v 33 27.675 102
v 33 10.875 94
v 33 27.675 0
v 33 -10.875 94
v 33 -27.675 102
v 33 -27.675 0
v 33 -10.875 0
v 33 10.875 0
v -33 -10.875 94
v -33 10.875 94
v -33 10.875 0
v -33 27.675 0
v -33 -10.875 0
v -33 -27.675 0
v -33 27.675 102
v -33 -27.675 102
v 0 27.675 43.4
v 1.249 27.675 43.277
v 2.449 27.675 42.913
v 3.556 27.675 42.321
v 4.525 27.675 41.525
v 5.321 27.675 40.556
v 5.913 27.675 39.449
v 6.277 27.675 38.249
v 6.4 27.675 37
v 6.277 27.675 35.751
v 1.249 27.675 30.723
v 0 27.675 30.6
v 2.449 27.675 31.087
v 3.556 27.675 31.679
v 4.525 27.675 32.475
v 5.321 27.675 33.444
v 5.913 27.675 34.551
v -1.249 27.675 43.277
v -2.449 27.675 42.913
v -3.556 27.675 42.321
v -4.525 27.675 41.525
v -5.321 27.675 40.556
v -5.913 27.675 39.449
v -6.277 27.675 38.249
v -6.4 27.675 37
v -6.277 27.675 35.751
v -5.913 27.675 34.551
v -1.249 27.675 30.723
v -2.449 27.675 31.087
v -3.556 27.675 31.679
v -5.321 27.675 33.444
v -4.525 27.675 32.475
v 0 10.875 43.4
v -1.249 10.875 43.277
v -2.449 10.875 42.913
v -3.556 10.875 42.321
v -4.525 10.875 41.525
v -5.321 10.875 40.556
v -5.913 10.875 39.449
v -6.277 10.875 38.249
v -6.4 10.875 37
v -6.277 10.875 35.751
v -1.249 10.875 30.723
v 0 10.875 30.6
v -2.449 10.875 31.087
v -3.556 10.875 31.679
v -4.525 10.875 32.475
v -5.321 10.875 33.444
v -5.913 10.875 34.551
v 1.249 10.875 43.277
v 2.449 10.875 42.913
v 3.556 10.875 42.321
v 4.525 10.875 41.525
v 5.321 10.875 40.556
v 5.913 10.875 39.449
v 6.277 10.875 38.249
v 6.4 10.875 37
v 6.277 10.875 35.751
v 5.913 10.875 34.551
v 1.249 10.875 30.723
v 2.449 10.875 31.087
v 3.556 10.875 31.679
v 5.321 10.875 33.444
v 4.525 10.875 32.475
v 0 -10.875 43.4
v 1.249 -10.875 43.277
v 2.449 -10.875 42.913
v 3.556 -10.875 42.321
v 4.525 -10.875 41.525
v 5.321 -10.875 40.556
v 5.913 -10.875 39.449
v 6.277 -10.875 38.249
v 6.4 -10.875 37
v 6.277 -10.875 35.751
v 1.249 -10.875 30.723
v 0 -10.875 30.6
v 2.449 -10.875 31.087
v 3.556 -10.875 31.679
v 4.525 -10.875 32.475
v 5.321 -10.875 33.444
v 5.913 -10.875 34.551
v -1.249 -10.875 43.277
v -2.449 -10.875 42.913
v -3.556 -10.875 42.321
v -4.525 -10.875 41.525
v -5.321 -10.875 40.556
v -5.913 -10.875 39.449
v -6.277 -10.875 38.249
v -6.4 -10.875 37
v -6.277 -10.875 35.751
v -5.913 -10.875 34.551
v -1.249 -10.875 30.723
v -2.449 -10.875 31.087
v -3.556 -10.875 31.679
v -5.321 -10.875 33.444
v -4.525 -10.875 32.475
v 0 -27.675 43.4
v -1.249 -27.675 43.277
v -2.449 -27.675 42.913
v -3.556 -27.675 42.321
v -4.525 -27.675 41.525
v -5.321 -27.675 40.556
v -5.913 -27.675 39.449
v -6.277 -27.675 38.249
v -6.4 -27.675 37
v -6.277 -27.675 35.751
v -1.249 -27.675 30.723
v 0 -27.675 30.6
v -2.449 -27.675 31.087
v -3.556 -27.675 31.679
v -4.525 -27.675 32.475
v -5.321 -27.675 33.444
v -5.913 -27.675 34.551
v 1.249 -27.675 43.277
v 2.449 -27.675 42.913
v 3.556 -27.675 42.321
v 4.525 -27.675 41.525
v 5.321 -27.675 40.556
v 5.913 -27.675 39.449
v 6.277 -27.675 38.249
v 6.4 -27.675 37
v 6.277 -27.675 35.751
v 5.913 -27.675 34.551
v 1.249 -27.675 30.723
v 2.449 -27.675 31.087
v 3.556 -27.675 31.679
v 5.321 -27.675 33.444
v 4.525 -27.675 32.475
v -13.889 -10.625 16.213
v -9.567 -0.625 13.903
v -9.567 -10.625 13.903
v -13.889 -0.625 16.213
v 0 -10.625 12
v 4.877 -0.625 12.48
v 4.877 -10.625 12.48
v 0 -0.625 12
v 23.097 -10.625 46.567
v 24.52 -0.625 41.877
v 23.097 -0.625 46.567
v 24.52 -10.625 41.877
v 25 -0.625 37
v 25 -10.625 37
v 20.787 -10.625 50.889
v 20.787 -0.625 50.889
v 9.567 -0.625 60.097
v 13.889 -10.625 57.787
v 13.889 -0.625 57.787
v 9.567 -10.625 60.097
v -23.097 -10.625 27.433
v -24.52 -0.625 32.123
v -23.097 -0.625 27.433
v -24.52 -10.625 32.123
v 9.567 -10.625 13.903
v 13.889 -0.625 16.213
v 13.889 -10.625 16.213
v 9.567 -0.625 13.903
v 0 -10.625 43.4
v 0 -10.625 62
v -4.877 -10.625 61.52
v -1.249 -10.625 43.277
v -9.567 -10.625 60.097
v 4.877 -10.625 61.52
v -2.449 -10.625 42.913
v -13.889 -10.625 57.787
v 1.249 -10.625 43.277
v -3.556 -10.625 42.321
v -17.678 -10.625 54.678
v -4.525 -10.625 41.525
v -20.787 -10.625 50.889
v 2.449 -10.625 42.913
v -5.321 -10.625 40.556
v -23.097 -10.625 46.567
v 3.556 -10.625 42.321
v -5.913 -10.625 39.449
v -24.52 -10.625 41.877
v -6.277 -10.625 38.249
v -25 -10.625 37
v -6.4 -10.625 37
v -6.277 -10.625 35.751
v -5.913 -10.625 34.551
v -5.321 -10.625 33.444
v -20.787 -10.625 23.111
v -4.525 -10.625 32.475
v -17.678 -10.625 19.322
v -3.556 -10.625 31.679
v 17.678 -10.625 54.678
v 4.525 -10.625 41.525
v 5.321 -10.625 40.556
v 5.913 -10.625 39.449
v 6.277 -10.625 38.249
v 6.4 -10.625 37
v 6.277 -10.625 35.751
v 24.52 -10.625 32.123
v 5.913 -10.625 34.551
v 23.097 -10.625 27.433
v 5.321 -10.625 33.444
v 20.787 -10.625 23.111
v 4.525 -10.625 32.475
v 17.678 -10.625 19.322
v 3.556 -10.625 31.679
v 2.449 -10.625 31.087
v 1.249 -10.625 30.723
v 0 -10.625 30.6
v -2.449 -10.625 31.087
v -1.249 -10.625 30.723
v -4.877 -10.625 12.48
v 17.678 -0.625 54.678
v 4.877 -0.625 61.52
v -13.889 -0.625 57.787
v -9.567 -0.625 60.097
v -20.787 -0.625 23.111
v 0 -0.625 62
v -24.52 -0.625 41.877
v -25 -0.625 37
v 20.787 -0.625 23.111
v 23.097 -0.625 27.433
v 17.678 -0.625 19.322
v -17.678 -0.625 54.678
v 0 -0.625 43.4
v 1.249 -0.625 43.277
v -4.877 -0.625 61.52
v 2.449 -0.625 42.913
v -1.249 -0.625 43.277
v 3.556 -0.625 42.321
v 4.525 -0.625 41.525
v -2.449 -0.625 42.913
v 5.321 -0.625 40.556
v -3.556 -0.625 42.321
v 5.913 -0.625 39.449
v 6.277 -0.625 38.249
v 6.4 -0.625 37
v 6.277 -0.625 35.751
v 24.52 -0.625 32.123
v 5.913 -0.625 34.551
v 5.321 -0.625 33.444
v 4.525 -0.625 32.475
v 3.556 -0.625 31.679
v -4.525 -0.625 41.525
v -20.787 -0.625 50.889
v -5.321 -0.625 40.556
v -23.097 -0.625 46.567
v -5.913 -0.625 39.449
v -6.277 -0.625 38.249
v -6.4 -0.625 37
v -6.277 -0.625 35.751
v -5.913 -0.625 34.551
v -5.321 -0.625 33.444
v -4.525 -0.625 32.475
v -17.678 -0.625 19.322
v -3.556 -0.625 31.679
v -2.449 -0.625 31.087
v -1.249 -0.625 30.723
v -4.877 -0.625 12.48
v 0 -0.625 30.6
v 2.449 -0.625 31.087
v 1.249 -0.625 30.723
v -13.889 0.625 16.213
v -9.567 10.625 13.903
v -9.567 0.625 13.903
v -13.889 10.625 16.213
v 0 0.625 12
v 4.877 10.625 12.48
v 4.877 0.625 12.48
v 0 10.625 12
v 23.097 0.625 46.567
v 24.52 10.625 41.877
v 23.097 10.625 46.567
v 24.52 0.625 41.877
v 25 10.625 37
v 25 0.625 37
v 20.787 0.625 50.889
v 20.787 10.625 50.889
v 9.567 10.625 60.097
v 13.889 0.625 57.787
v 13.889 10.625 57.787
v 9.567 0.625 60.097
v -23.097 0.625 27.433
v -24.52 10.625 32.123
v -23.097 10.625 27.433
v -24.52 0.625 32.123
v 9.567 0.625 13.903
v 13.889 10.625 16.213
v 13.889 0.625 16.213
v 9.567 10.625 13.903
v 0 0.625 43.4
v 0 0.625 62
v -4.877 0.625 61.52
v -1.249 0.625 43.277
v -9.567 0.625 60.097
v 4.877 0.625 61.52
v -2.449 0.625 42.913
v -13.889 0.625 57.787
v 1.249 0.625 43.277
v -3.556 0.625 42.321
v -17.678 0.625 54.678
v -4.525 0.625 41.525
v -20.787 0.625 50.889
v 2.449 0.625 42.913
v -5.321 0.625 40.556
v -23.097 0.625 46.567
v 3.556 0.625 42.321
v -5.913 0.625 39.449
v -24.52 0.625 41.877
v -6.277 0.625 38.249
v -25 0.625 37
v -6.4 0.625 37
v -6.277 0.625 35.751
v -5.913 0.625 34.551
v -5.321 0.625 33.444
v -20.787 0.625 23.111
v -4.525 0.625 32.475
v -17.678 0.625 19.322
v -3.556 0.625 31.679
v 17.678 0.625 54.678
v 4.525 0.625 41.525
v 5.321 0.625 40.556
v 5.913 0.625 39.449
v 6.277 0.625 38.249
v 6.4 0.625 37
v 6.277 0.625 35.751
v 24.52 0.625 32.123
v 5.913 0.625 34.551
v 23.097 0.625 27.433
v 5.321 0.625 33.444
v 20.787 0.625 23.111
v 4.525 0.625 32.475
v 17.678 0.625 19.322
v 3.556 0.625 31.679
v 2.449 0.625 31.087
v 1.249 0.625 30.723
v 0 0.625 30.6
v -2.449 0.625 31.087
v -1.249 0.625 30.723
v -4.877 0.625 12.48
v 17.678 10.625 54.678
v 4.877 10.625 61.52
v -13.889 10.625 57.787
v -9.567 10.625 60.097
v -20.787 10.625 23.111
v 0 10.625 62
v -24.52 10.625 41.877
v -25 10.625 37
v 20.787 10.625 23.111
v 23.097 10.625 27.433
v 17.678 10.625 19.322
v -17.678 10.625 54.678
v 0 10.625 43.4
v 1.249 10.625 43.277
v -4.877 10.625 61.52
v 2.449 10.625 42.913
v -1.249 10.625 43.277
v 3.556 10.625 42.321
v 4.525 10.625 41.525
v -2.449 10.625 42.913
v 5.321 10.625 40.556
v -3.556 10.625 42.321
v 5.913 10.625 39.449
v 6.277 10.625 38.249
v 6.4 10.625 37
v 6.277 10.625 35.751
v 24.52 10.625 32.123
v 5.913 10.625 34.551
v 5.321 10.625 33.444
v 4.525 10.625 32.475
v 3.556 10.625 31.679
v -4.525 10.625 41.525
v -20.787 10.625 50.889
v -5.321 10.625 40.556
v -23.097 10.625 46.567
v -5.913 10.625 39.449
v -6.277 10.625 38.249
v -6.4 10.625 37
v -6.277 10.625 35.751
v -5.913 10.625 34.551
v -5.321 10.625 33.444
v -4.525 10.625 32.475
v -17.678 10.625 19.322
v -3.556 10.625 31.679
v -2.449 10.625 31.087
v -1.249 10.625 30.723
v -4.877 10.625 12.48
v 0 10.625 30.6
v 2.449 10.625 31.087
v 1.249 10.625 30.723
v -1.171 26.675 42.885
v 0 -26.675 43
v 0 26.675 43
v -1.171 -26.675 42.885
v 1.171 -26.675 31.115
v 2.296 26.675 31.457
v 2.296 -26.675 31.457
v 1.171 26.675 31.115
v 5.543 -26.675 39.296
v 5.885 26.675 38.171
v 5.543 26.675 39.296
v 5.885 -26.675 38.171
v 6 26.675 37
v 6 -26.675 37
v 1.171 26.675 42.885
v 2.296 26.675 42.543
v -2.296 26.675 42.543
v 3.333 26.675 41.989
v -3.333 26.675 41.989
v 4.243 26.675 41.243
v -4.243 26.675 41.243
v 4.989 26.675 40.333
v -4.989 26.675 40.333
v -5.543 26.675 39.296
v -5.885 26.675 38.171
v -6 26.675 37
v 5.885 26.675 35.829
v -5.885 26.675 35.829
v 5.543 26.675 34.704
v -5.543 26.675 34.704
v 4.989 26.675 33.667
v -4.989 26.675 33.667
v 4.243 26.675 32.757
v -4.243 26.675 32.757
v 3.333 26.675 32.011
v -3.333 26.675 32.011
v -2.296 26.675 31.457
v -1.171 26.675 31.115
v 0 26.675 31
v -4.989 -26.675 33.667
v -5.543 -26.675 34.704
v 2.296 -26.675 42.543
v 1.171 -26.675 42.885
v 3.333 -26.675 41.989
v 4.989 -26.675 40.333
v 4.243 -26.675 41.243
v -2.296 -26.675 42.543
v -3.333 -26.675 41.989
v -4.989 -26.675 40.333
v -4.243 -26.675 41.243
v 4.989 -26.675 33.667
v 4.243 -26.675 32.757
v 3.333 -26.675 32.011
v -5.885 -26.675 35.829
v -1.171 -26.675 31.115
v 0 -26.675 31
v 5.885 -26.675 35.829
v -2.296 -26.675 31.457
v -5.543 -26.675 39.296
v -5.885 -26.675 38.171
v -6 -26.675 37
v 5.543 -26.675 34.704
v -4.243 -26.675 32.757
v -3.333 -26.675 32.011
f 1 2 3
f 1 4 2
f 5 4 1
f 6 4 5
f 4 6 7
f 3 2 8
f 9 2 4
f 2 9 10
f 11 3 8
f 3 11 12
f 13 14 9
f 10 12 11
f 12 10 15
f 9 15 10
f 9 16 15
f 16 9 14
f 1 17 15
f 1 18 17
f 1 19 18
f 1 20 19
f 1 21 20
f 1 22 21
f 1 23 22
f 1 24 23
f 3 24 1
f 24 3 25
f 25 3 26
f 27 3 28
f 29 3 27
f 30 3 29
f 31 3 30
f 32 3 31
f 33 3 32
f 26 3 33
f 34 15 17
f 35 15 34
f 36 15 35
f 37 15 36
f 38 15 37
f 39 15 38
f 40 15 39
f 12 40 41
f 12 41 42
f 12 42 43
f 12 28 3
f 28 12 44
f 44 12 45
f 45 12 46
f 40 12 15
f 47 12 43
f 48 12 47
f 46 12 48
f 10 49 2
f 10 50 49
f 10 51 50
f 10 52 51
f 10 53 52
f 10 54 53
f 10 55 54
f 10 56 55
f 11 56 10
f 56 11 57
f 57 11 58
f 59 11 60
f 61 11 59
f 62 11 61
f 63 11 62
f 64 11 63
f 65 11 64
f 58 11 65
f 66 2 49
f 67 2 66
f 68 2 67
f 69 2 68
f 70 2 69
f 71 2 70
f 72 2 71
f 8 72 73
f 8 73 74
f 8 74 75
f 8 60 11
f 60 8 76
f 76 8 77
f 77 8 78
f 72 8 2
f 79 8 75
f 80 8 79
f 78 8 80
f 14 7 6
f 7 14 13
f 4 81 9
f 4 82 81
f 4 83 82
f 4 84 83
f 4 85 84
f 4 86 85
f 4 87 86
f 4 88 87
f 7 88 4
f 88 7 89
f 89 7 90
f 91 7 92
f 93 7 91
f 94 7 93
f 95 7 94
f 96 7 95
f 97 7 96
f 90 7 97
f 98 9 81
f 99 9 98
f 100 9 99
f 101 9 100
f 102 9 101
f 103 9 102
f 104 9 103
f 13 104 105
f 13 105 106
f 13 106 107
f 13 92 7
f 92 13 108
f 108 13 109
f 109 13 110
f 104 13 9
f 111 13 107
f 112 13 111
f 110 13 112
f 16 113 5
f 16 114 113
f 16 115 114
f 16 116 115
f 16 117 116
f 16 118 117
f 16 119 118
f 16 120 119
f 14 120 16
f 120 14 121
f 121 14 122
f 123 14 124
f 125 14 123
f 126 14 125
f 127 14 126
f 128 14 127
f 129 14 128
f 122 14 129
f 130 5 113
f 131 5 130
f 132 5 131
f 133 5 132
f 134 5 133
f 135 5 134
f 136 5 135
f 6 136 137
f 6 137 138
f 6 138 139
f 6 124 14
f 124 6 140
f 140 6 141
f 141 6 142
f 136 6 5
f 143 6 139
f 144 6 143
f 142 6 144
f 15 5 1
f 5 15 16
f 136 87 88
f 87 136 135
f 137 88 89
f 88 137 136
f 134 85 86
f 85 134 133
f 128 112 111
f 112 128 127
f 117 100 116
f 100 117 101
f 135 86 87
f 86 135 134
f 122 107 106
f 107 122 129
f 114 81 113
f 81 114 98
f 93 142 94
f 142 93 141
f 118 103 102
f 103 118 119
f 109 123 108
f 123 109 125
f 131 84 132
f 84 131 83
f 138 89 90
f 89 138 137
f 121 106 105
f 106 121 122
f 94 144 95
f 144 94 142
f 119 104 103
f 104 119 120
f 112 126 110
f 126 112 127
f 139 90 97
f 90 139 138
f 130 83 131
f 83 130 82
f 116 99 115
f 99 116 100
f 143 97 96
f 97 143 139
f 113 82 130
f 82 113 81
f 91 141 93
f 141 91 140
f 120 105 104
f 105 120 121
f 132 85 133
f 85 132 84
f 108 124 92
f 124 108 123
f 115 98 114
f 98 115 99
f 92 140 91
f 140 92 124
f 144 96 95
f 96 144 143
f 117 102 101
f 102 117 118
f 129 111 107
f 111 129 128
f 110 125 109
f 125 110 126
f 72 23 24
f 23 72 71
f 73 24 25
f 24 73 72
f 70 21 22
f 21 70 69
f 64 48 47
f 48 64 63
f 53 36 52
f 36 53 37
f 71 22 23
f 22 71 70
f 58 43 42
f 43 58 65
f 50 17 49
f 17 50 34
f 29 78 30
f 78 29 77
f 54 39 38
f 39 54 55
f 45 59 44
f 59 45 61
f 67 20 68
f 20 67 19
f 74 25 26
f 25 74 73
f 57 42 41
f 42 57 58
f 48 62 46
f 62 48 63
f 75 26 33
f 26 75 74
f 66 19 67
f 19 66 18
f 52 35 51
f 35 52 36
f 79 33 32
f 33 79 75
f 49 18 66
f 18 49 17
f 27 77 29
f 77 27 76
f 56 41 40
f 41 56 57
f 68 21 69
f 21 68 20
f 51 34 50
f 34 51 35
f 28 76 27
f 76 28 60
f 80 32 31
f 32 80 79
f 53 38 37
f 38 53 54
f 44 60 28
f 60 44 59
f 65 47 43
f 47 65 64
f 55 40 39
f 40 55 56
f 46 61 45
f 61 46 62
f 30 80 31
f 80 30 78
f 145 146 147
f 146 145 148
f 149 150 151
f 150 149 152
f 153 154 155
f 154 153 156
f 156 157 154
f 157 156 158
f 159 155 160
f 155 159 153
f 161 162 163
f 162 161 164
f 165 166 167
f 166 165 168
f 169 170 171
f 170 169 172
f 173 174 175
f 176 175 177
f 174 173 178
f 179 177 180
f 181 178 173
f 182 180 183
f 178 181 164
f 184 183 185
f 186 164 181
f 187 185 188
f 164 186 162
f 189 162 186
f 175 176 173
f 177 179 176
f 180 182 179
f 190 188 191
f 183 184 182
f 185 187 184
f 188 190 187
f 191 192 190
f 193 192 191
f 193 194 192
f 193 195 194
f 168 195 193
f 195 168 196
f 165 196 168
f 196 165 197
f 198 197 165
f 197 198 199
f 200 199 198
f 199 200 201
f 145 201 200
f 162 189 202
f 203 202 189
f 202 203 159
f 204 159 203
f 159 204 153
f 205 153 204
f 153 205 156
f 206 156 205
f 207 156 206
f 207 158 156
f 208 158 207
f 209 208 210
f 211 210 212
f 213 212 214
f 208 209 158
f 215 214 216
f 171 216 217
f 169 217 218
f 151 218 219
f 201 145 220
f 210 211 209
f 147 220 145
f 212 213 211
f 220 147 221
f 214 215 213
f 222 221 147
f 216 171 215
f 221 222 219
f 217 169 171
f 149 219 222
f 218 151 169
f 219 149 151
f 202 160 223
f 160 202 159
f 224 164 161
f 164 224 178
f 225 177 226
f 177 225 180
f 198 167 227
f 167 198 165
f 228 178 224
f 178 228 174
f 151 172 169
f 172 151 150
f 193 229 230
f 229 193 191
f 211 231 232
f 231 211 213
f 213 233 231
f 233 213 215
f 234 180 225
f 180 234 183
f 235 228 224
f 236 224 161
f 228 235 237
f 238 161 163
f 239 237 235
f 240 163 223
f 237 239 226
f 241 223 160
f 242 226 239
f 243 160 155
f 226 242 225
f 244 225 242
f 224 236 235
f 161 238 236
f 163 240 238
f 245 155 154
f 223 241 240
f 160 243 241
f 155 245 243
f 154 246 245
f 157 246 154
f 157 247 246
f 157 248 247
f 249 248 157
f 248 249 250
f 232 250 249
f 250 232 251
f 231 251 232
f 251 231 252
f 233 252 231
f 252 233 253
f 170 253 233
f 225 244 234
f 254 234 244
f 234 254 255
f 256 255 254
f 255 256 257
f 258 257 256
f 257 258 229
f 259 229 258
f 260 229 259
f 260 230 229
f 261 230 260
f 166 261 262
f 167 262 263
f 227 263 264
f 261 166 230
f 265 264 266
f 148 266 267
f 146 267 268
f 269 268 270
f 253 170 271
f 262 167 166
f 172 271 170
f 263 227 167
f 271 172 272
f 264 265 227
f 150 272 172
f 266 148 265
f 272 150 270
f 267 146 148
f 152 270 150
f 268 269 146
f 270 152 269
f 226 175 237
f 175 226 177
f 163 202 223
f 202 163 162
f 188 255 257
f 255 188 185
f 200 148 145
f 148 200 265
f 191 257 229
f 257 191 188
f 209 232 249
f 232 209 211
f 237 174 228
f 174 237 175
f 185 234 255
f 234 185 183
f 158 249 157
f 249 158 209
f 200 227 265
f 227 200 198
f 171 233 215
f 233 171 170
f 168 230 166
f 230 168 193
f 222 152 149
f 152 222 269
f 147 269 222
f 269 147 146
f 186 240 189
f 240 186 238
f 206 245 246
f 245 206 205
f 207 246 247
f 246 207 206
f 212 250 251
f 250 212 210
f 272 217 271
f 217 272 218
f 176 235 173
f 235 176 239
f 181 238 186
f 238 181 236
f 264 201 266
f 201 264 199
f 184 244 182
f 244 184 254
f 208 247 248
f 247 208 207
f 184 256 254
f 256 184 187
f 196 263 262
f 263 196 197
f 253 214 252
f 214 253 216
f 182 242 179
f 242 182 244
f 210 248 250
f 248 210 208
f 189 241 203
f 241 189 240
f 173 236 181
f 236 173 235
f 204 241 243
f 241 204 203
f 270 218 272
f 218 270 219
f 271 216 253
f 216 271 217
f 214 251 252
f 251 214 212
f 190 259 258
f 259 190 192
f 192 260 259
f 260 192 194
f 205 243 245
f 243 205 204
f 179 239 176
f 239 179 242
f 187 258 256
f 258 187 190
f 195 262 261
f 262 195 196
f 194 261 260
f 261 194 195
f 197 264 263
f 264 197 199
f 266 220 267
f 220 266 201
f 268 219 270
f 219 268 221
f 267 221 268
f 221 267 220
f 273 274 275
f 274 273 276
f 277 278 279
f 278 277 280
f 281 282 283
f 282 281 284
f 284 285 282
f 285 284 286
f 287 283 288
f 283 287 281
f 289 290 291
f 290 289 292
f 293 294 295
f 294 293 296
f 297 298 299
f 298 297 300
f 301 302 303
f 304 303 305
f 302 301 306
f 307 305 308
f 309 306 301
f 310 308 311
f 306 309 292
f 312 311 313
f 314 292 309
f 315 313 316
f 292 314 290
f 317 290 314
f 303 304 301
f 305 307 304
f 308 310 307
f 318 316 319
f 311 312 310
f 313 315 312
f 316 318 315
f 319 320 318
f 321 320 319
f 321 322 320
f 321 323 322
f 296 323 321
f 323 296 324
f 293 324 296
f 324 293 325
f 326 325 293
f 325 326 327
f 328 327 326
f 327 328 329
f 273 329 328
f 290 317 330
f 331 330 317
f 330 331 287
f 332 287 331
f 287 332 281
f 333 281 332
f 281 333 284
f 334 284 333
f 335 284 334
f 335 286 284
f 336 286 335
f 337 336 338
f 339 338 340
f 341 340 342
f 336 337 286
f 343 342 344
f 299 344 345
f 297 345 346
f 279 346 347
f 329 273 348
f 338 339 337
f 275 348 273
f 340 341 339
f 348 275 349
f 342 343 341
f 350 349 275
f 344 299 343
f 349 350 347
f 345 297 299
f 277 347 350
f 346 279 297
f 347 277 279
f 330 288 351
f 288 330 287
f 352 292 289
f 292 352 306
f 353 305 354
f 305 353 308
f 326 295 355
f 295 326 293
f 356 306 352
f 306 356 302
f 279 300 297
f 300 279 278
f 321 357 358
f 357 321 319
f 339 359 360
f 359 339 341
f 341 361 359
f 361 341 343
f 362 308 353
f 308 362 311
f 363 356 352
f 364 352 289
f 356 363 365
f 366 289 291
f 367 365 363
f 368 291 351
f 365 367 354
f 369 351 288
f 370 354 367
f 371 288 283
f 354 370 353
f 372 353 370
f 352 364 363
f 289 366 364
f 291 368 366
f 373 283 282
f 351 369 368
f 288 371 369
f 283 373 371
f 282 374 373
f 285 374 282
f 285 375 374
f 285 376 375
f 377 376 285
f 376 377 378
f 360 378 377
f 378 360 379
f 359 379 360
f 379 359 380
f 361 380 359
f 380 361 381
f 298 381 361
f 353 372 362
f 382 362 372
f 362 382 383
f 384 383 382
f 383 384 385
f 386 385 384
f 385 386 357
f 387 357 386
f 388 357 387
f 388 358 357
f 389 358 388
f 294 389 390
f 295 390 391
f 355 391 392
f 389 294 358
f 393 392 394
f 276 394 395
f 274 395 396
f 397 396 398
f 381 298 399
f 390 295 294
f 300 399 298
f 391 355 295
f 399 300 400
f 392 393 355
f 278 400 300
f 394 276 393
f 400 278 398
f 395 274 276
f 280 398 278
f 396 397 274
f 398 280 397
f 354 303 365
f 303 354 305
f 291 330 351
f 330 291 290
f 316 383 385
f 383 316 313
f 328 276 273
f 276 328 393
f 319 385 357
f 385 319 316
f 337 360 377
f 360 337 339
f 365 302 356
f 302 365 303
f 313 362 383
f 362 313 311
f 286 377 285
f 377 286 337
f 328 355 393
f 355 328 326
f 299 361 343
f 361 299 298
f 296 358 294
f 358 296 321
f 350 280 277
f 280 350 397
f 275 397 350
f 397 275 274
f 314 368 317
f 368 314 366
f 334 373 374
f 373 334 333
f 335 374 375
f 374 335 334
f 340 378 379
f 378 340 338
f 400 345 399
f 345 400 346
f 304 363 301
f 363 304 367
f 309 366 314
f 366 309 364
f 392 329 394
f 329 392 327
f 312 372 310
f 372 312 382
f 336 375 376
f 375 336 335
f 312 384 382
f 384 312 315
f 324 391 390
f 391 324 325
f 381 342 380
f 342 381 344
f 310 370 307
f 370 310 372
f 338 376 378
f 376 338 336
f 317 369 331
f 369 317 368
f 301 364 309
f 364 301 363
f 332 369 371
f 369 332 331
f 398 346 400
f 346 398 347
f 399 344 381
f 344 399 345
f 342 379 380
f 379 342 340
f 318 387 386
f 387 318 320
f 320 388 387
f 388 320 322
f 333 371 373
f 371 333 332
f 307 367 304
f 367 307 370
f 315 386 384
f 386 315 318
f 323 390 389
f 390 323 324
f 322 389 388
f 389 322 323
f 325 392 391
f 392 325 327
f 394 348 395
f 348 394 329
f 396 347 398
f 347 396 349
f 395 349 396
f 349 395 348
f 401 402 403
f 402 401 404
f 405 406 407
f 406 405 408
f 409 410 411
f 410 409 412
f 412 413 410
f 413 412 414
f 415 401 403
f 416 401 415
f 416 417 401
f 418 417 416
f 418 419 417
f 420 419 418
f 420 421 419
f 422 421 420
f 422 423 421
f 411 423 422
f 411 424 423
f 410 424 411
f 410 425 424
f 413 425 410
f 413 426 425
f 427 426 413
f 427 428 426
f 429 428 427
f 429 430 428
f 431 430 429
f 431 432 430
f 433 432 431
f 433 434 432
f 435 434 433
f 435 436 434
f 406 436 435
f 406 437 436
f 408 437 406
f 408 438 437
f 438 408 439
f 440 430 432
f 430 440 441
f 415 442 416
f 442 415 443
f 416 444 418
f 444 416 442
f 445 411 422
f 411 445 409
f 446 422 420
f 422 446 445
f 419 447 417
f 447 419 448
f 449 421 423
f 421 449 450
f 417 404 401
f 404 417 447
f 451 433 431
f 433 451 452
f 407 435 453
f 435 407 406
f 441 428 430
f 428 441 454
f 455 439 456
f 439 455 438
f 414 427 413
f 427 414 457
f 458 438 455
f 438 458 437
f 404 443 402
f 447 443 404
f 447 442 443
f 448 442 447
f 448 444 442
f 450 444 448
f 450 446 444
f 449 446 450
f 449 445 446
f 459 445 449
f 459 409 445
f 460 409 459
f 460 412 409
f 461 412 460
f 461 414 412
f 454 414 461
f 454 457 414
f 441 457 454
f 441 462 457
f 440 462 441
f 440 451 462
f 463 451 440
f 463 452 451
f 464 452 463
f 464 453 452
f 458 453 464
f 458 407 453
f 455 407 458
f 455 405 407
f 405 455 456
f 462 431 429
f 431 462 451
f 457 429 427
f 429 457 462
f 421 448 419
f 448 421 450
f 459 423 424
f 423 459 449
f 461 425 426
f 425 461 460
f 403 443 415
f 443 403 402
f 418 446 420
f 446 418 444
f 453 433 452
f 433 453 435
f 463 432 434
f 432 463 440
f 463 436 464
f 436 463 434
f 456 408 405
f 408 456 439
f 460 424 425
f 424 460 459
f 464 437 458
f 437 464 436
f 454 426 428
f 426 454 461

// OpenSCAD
$fn = 32;

// ------------------------------------------------------------------------
// Trolley wheel set: wheels d50, fork 94 mm tall
// Every part is its own module, assembly() places every instance.
// ------------------------------------------------------------------------

// --- part 1 ---
module trolley_fork() {
  difference() {
    union() {
      translate([-33, 10.875, 0]) cube([66, 16.8, 94]);
      translate([-33, -27.675, 0]) cube([66, 16.8, 94]);
      translate([-33, -27.675, 94]) cube([66, 55.35, 8]);
    }
    translate([0, -19.275, 37]) rotate([90, 0, 0]) cylinder(h = 18.8, d = 12.8, center = true);
    translate([0, 19.275, 37]) rotate([90, 0, 0]) cylinder(h = 18.8, d = 12.8, center = true);
  }
}

// --- part 2 ---
module trolley_wheel() {
  difference() {
      translate([0, 0, 0]) cylinder(h = 10, d = 50);
      translate([0, 0, -1]) cylinder(h = 12, d = 12.8);
    }
}

// --- part 3 ---
module trolley_axle() {
  translate([0, 0, -26.675]) cylinder(h = 53.35, d = 12);
}

// --- assembly ---
module assembly() {
  color([0.80, 0.24, 0.20]) translate([0, 0, 0]) rotate([0, 0, 0]) trolley_fork();
  color([0.20, 0.45, 0.75]) translate([0, -0.625, 37]) rotate([90, 0, 0]) trolley_wheel();
  color([0.25, 0.62, 0.32]) translate([0, 10.625, 37]) rotate([90, 0, 0]) trolley_wheel();
  color([0.92, 0.70, 0.18]) translate([0, 0, 37]) rotate([90, 0, 0]) trolley_axle();
}

assembly();
